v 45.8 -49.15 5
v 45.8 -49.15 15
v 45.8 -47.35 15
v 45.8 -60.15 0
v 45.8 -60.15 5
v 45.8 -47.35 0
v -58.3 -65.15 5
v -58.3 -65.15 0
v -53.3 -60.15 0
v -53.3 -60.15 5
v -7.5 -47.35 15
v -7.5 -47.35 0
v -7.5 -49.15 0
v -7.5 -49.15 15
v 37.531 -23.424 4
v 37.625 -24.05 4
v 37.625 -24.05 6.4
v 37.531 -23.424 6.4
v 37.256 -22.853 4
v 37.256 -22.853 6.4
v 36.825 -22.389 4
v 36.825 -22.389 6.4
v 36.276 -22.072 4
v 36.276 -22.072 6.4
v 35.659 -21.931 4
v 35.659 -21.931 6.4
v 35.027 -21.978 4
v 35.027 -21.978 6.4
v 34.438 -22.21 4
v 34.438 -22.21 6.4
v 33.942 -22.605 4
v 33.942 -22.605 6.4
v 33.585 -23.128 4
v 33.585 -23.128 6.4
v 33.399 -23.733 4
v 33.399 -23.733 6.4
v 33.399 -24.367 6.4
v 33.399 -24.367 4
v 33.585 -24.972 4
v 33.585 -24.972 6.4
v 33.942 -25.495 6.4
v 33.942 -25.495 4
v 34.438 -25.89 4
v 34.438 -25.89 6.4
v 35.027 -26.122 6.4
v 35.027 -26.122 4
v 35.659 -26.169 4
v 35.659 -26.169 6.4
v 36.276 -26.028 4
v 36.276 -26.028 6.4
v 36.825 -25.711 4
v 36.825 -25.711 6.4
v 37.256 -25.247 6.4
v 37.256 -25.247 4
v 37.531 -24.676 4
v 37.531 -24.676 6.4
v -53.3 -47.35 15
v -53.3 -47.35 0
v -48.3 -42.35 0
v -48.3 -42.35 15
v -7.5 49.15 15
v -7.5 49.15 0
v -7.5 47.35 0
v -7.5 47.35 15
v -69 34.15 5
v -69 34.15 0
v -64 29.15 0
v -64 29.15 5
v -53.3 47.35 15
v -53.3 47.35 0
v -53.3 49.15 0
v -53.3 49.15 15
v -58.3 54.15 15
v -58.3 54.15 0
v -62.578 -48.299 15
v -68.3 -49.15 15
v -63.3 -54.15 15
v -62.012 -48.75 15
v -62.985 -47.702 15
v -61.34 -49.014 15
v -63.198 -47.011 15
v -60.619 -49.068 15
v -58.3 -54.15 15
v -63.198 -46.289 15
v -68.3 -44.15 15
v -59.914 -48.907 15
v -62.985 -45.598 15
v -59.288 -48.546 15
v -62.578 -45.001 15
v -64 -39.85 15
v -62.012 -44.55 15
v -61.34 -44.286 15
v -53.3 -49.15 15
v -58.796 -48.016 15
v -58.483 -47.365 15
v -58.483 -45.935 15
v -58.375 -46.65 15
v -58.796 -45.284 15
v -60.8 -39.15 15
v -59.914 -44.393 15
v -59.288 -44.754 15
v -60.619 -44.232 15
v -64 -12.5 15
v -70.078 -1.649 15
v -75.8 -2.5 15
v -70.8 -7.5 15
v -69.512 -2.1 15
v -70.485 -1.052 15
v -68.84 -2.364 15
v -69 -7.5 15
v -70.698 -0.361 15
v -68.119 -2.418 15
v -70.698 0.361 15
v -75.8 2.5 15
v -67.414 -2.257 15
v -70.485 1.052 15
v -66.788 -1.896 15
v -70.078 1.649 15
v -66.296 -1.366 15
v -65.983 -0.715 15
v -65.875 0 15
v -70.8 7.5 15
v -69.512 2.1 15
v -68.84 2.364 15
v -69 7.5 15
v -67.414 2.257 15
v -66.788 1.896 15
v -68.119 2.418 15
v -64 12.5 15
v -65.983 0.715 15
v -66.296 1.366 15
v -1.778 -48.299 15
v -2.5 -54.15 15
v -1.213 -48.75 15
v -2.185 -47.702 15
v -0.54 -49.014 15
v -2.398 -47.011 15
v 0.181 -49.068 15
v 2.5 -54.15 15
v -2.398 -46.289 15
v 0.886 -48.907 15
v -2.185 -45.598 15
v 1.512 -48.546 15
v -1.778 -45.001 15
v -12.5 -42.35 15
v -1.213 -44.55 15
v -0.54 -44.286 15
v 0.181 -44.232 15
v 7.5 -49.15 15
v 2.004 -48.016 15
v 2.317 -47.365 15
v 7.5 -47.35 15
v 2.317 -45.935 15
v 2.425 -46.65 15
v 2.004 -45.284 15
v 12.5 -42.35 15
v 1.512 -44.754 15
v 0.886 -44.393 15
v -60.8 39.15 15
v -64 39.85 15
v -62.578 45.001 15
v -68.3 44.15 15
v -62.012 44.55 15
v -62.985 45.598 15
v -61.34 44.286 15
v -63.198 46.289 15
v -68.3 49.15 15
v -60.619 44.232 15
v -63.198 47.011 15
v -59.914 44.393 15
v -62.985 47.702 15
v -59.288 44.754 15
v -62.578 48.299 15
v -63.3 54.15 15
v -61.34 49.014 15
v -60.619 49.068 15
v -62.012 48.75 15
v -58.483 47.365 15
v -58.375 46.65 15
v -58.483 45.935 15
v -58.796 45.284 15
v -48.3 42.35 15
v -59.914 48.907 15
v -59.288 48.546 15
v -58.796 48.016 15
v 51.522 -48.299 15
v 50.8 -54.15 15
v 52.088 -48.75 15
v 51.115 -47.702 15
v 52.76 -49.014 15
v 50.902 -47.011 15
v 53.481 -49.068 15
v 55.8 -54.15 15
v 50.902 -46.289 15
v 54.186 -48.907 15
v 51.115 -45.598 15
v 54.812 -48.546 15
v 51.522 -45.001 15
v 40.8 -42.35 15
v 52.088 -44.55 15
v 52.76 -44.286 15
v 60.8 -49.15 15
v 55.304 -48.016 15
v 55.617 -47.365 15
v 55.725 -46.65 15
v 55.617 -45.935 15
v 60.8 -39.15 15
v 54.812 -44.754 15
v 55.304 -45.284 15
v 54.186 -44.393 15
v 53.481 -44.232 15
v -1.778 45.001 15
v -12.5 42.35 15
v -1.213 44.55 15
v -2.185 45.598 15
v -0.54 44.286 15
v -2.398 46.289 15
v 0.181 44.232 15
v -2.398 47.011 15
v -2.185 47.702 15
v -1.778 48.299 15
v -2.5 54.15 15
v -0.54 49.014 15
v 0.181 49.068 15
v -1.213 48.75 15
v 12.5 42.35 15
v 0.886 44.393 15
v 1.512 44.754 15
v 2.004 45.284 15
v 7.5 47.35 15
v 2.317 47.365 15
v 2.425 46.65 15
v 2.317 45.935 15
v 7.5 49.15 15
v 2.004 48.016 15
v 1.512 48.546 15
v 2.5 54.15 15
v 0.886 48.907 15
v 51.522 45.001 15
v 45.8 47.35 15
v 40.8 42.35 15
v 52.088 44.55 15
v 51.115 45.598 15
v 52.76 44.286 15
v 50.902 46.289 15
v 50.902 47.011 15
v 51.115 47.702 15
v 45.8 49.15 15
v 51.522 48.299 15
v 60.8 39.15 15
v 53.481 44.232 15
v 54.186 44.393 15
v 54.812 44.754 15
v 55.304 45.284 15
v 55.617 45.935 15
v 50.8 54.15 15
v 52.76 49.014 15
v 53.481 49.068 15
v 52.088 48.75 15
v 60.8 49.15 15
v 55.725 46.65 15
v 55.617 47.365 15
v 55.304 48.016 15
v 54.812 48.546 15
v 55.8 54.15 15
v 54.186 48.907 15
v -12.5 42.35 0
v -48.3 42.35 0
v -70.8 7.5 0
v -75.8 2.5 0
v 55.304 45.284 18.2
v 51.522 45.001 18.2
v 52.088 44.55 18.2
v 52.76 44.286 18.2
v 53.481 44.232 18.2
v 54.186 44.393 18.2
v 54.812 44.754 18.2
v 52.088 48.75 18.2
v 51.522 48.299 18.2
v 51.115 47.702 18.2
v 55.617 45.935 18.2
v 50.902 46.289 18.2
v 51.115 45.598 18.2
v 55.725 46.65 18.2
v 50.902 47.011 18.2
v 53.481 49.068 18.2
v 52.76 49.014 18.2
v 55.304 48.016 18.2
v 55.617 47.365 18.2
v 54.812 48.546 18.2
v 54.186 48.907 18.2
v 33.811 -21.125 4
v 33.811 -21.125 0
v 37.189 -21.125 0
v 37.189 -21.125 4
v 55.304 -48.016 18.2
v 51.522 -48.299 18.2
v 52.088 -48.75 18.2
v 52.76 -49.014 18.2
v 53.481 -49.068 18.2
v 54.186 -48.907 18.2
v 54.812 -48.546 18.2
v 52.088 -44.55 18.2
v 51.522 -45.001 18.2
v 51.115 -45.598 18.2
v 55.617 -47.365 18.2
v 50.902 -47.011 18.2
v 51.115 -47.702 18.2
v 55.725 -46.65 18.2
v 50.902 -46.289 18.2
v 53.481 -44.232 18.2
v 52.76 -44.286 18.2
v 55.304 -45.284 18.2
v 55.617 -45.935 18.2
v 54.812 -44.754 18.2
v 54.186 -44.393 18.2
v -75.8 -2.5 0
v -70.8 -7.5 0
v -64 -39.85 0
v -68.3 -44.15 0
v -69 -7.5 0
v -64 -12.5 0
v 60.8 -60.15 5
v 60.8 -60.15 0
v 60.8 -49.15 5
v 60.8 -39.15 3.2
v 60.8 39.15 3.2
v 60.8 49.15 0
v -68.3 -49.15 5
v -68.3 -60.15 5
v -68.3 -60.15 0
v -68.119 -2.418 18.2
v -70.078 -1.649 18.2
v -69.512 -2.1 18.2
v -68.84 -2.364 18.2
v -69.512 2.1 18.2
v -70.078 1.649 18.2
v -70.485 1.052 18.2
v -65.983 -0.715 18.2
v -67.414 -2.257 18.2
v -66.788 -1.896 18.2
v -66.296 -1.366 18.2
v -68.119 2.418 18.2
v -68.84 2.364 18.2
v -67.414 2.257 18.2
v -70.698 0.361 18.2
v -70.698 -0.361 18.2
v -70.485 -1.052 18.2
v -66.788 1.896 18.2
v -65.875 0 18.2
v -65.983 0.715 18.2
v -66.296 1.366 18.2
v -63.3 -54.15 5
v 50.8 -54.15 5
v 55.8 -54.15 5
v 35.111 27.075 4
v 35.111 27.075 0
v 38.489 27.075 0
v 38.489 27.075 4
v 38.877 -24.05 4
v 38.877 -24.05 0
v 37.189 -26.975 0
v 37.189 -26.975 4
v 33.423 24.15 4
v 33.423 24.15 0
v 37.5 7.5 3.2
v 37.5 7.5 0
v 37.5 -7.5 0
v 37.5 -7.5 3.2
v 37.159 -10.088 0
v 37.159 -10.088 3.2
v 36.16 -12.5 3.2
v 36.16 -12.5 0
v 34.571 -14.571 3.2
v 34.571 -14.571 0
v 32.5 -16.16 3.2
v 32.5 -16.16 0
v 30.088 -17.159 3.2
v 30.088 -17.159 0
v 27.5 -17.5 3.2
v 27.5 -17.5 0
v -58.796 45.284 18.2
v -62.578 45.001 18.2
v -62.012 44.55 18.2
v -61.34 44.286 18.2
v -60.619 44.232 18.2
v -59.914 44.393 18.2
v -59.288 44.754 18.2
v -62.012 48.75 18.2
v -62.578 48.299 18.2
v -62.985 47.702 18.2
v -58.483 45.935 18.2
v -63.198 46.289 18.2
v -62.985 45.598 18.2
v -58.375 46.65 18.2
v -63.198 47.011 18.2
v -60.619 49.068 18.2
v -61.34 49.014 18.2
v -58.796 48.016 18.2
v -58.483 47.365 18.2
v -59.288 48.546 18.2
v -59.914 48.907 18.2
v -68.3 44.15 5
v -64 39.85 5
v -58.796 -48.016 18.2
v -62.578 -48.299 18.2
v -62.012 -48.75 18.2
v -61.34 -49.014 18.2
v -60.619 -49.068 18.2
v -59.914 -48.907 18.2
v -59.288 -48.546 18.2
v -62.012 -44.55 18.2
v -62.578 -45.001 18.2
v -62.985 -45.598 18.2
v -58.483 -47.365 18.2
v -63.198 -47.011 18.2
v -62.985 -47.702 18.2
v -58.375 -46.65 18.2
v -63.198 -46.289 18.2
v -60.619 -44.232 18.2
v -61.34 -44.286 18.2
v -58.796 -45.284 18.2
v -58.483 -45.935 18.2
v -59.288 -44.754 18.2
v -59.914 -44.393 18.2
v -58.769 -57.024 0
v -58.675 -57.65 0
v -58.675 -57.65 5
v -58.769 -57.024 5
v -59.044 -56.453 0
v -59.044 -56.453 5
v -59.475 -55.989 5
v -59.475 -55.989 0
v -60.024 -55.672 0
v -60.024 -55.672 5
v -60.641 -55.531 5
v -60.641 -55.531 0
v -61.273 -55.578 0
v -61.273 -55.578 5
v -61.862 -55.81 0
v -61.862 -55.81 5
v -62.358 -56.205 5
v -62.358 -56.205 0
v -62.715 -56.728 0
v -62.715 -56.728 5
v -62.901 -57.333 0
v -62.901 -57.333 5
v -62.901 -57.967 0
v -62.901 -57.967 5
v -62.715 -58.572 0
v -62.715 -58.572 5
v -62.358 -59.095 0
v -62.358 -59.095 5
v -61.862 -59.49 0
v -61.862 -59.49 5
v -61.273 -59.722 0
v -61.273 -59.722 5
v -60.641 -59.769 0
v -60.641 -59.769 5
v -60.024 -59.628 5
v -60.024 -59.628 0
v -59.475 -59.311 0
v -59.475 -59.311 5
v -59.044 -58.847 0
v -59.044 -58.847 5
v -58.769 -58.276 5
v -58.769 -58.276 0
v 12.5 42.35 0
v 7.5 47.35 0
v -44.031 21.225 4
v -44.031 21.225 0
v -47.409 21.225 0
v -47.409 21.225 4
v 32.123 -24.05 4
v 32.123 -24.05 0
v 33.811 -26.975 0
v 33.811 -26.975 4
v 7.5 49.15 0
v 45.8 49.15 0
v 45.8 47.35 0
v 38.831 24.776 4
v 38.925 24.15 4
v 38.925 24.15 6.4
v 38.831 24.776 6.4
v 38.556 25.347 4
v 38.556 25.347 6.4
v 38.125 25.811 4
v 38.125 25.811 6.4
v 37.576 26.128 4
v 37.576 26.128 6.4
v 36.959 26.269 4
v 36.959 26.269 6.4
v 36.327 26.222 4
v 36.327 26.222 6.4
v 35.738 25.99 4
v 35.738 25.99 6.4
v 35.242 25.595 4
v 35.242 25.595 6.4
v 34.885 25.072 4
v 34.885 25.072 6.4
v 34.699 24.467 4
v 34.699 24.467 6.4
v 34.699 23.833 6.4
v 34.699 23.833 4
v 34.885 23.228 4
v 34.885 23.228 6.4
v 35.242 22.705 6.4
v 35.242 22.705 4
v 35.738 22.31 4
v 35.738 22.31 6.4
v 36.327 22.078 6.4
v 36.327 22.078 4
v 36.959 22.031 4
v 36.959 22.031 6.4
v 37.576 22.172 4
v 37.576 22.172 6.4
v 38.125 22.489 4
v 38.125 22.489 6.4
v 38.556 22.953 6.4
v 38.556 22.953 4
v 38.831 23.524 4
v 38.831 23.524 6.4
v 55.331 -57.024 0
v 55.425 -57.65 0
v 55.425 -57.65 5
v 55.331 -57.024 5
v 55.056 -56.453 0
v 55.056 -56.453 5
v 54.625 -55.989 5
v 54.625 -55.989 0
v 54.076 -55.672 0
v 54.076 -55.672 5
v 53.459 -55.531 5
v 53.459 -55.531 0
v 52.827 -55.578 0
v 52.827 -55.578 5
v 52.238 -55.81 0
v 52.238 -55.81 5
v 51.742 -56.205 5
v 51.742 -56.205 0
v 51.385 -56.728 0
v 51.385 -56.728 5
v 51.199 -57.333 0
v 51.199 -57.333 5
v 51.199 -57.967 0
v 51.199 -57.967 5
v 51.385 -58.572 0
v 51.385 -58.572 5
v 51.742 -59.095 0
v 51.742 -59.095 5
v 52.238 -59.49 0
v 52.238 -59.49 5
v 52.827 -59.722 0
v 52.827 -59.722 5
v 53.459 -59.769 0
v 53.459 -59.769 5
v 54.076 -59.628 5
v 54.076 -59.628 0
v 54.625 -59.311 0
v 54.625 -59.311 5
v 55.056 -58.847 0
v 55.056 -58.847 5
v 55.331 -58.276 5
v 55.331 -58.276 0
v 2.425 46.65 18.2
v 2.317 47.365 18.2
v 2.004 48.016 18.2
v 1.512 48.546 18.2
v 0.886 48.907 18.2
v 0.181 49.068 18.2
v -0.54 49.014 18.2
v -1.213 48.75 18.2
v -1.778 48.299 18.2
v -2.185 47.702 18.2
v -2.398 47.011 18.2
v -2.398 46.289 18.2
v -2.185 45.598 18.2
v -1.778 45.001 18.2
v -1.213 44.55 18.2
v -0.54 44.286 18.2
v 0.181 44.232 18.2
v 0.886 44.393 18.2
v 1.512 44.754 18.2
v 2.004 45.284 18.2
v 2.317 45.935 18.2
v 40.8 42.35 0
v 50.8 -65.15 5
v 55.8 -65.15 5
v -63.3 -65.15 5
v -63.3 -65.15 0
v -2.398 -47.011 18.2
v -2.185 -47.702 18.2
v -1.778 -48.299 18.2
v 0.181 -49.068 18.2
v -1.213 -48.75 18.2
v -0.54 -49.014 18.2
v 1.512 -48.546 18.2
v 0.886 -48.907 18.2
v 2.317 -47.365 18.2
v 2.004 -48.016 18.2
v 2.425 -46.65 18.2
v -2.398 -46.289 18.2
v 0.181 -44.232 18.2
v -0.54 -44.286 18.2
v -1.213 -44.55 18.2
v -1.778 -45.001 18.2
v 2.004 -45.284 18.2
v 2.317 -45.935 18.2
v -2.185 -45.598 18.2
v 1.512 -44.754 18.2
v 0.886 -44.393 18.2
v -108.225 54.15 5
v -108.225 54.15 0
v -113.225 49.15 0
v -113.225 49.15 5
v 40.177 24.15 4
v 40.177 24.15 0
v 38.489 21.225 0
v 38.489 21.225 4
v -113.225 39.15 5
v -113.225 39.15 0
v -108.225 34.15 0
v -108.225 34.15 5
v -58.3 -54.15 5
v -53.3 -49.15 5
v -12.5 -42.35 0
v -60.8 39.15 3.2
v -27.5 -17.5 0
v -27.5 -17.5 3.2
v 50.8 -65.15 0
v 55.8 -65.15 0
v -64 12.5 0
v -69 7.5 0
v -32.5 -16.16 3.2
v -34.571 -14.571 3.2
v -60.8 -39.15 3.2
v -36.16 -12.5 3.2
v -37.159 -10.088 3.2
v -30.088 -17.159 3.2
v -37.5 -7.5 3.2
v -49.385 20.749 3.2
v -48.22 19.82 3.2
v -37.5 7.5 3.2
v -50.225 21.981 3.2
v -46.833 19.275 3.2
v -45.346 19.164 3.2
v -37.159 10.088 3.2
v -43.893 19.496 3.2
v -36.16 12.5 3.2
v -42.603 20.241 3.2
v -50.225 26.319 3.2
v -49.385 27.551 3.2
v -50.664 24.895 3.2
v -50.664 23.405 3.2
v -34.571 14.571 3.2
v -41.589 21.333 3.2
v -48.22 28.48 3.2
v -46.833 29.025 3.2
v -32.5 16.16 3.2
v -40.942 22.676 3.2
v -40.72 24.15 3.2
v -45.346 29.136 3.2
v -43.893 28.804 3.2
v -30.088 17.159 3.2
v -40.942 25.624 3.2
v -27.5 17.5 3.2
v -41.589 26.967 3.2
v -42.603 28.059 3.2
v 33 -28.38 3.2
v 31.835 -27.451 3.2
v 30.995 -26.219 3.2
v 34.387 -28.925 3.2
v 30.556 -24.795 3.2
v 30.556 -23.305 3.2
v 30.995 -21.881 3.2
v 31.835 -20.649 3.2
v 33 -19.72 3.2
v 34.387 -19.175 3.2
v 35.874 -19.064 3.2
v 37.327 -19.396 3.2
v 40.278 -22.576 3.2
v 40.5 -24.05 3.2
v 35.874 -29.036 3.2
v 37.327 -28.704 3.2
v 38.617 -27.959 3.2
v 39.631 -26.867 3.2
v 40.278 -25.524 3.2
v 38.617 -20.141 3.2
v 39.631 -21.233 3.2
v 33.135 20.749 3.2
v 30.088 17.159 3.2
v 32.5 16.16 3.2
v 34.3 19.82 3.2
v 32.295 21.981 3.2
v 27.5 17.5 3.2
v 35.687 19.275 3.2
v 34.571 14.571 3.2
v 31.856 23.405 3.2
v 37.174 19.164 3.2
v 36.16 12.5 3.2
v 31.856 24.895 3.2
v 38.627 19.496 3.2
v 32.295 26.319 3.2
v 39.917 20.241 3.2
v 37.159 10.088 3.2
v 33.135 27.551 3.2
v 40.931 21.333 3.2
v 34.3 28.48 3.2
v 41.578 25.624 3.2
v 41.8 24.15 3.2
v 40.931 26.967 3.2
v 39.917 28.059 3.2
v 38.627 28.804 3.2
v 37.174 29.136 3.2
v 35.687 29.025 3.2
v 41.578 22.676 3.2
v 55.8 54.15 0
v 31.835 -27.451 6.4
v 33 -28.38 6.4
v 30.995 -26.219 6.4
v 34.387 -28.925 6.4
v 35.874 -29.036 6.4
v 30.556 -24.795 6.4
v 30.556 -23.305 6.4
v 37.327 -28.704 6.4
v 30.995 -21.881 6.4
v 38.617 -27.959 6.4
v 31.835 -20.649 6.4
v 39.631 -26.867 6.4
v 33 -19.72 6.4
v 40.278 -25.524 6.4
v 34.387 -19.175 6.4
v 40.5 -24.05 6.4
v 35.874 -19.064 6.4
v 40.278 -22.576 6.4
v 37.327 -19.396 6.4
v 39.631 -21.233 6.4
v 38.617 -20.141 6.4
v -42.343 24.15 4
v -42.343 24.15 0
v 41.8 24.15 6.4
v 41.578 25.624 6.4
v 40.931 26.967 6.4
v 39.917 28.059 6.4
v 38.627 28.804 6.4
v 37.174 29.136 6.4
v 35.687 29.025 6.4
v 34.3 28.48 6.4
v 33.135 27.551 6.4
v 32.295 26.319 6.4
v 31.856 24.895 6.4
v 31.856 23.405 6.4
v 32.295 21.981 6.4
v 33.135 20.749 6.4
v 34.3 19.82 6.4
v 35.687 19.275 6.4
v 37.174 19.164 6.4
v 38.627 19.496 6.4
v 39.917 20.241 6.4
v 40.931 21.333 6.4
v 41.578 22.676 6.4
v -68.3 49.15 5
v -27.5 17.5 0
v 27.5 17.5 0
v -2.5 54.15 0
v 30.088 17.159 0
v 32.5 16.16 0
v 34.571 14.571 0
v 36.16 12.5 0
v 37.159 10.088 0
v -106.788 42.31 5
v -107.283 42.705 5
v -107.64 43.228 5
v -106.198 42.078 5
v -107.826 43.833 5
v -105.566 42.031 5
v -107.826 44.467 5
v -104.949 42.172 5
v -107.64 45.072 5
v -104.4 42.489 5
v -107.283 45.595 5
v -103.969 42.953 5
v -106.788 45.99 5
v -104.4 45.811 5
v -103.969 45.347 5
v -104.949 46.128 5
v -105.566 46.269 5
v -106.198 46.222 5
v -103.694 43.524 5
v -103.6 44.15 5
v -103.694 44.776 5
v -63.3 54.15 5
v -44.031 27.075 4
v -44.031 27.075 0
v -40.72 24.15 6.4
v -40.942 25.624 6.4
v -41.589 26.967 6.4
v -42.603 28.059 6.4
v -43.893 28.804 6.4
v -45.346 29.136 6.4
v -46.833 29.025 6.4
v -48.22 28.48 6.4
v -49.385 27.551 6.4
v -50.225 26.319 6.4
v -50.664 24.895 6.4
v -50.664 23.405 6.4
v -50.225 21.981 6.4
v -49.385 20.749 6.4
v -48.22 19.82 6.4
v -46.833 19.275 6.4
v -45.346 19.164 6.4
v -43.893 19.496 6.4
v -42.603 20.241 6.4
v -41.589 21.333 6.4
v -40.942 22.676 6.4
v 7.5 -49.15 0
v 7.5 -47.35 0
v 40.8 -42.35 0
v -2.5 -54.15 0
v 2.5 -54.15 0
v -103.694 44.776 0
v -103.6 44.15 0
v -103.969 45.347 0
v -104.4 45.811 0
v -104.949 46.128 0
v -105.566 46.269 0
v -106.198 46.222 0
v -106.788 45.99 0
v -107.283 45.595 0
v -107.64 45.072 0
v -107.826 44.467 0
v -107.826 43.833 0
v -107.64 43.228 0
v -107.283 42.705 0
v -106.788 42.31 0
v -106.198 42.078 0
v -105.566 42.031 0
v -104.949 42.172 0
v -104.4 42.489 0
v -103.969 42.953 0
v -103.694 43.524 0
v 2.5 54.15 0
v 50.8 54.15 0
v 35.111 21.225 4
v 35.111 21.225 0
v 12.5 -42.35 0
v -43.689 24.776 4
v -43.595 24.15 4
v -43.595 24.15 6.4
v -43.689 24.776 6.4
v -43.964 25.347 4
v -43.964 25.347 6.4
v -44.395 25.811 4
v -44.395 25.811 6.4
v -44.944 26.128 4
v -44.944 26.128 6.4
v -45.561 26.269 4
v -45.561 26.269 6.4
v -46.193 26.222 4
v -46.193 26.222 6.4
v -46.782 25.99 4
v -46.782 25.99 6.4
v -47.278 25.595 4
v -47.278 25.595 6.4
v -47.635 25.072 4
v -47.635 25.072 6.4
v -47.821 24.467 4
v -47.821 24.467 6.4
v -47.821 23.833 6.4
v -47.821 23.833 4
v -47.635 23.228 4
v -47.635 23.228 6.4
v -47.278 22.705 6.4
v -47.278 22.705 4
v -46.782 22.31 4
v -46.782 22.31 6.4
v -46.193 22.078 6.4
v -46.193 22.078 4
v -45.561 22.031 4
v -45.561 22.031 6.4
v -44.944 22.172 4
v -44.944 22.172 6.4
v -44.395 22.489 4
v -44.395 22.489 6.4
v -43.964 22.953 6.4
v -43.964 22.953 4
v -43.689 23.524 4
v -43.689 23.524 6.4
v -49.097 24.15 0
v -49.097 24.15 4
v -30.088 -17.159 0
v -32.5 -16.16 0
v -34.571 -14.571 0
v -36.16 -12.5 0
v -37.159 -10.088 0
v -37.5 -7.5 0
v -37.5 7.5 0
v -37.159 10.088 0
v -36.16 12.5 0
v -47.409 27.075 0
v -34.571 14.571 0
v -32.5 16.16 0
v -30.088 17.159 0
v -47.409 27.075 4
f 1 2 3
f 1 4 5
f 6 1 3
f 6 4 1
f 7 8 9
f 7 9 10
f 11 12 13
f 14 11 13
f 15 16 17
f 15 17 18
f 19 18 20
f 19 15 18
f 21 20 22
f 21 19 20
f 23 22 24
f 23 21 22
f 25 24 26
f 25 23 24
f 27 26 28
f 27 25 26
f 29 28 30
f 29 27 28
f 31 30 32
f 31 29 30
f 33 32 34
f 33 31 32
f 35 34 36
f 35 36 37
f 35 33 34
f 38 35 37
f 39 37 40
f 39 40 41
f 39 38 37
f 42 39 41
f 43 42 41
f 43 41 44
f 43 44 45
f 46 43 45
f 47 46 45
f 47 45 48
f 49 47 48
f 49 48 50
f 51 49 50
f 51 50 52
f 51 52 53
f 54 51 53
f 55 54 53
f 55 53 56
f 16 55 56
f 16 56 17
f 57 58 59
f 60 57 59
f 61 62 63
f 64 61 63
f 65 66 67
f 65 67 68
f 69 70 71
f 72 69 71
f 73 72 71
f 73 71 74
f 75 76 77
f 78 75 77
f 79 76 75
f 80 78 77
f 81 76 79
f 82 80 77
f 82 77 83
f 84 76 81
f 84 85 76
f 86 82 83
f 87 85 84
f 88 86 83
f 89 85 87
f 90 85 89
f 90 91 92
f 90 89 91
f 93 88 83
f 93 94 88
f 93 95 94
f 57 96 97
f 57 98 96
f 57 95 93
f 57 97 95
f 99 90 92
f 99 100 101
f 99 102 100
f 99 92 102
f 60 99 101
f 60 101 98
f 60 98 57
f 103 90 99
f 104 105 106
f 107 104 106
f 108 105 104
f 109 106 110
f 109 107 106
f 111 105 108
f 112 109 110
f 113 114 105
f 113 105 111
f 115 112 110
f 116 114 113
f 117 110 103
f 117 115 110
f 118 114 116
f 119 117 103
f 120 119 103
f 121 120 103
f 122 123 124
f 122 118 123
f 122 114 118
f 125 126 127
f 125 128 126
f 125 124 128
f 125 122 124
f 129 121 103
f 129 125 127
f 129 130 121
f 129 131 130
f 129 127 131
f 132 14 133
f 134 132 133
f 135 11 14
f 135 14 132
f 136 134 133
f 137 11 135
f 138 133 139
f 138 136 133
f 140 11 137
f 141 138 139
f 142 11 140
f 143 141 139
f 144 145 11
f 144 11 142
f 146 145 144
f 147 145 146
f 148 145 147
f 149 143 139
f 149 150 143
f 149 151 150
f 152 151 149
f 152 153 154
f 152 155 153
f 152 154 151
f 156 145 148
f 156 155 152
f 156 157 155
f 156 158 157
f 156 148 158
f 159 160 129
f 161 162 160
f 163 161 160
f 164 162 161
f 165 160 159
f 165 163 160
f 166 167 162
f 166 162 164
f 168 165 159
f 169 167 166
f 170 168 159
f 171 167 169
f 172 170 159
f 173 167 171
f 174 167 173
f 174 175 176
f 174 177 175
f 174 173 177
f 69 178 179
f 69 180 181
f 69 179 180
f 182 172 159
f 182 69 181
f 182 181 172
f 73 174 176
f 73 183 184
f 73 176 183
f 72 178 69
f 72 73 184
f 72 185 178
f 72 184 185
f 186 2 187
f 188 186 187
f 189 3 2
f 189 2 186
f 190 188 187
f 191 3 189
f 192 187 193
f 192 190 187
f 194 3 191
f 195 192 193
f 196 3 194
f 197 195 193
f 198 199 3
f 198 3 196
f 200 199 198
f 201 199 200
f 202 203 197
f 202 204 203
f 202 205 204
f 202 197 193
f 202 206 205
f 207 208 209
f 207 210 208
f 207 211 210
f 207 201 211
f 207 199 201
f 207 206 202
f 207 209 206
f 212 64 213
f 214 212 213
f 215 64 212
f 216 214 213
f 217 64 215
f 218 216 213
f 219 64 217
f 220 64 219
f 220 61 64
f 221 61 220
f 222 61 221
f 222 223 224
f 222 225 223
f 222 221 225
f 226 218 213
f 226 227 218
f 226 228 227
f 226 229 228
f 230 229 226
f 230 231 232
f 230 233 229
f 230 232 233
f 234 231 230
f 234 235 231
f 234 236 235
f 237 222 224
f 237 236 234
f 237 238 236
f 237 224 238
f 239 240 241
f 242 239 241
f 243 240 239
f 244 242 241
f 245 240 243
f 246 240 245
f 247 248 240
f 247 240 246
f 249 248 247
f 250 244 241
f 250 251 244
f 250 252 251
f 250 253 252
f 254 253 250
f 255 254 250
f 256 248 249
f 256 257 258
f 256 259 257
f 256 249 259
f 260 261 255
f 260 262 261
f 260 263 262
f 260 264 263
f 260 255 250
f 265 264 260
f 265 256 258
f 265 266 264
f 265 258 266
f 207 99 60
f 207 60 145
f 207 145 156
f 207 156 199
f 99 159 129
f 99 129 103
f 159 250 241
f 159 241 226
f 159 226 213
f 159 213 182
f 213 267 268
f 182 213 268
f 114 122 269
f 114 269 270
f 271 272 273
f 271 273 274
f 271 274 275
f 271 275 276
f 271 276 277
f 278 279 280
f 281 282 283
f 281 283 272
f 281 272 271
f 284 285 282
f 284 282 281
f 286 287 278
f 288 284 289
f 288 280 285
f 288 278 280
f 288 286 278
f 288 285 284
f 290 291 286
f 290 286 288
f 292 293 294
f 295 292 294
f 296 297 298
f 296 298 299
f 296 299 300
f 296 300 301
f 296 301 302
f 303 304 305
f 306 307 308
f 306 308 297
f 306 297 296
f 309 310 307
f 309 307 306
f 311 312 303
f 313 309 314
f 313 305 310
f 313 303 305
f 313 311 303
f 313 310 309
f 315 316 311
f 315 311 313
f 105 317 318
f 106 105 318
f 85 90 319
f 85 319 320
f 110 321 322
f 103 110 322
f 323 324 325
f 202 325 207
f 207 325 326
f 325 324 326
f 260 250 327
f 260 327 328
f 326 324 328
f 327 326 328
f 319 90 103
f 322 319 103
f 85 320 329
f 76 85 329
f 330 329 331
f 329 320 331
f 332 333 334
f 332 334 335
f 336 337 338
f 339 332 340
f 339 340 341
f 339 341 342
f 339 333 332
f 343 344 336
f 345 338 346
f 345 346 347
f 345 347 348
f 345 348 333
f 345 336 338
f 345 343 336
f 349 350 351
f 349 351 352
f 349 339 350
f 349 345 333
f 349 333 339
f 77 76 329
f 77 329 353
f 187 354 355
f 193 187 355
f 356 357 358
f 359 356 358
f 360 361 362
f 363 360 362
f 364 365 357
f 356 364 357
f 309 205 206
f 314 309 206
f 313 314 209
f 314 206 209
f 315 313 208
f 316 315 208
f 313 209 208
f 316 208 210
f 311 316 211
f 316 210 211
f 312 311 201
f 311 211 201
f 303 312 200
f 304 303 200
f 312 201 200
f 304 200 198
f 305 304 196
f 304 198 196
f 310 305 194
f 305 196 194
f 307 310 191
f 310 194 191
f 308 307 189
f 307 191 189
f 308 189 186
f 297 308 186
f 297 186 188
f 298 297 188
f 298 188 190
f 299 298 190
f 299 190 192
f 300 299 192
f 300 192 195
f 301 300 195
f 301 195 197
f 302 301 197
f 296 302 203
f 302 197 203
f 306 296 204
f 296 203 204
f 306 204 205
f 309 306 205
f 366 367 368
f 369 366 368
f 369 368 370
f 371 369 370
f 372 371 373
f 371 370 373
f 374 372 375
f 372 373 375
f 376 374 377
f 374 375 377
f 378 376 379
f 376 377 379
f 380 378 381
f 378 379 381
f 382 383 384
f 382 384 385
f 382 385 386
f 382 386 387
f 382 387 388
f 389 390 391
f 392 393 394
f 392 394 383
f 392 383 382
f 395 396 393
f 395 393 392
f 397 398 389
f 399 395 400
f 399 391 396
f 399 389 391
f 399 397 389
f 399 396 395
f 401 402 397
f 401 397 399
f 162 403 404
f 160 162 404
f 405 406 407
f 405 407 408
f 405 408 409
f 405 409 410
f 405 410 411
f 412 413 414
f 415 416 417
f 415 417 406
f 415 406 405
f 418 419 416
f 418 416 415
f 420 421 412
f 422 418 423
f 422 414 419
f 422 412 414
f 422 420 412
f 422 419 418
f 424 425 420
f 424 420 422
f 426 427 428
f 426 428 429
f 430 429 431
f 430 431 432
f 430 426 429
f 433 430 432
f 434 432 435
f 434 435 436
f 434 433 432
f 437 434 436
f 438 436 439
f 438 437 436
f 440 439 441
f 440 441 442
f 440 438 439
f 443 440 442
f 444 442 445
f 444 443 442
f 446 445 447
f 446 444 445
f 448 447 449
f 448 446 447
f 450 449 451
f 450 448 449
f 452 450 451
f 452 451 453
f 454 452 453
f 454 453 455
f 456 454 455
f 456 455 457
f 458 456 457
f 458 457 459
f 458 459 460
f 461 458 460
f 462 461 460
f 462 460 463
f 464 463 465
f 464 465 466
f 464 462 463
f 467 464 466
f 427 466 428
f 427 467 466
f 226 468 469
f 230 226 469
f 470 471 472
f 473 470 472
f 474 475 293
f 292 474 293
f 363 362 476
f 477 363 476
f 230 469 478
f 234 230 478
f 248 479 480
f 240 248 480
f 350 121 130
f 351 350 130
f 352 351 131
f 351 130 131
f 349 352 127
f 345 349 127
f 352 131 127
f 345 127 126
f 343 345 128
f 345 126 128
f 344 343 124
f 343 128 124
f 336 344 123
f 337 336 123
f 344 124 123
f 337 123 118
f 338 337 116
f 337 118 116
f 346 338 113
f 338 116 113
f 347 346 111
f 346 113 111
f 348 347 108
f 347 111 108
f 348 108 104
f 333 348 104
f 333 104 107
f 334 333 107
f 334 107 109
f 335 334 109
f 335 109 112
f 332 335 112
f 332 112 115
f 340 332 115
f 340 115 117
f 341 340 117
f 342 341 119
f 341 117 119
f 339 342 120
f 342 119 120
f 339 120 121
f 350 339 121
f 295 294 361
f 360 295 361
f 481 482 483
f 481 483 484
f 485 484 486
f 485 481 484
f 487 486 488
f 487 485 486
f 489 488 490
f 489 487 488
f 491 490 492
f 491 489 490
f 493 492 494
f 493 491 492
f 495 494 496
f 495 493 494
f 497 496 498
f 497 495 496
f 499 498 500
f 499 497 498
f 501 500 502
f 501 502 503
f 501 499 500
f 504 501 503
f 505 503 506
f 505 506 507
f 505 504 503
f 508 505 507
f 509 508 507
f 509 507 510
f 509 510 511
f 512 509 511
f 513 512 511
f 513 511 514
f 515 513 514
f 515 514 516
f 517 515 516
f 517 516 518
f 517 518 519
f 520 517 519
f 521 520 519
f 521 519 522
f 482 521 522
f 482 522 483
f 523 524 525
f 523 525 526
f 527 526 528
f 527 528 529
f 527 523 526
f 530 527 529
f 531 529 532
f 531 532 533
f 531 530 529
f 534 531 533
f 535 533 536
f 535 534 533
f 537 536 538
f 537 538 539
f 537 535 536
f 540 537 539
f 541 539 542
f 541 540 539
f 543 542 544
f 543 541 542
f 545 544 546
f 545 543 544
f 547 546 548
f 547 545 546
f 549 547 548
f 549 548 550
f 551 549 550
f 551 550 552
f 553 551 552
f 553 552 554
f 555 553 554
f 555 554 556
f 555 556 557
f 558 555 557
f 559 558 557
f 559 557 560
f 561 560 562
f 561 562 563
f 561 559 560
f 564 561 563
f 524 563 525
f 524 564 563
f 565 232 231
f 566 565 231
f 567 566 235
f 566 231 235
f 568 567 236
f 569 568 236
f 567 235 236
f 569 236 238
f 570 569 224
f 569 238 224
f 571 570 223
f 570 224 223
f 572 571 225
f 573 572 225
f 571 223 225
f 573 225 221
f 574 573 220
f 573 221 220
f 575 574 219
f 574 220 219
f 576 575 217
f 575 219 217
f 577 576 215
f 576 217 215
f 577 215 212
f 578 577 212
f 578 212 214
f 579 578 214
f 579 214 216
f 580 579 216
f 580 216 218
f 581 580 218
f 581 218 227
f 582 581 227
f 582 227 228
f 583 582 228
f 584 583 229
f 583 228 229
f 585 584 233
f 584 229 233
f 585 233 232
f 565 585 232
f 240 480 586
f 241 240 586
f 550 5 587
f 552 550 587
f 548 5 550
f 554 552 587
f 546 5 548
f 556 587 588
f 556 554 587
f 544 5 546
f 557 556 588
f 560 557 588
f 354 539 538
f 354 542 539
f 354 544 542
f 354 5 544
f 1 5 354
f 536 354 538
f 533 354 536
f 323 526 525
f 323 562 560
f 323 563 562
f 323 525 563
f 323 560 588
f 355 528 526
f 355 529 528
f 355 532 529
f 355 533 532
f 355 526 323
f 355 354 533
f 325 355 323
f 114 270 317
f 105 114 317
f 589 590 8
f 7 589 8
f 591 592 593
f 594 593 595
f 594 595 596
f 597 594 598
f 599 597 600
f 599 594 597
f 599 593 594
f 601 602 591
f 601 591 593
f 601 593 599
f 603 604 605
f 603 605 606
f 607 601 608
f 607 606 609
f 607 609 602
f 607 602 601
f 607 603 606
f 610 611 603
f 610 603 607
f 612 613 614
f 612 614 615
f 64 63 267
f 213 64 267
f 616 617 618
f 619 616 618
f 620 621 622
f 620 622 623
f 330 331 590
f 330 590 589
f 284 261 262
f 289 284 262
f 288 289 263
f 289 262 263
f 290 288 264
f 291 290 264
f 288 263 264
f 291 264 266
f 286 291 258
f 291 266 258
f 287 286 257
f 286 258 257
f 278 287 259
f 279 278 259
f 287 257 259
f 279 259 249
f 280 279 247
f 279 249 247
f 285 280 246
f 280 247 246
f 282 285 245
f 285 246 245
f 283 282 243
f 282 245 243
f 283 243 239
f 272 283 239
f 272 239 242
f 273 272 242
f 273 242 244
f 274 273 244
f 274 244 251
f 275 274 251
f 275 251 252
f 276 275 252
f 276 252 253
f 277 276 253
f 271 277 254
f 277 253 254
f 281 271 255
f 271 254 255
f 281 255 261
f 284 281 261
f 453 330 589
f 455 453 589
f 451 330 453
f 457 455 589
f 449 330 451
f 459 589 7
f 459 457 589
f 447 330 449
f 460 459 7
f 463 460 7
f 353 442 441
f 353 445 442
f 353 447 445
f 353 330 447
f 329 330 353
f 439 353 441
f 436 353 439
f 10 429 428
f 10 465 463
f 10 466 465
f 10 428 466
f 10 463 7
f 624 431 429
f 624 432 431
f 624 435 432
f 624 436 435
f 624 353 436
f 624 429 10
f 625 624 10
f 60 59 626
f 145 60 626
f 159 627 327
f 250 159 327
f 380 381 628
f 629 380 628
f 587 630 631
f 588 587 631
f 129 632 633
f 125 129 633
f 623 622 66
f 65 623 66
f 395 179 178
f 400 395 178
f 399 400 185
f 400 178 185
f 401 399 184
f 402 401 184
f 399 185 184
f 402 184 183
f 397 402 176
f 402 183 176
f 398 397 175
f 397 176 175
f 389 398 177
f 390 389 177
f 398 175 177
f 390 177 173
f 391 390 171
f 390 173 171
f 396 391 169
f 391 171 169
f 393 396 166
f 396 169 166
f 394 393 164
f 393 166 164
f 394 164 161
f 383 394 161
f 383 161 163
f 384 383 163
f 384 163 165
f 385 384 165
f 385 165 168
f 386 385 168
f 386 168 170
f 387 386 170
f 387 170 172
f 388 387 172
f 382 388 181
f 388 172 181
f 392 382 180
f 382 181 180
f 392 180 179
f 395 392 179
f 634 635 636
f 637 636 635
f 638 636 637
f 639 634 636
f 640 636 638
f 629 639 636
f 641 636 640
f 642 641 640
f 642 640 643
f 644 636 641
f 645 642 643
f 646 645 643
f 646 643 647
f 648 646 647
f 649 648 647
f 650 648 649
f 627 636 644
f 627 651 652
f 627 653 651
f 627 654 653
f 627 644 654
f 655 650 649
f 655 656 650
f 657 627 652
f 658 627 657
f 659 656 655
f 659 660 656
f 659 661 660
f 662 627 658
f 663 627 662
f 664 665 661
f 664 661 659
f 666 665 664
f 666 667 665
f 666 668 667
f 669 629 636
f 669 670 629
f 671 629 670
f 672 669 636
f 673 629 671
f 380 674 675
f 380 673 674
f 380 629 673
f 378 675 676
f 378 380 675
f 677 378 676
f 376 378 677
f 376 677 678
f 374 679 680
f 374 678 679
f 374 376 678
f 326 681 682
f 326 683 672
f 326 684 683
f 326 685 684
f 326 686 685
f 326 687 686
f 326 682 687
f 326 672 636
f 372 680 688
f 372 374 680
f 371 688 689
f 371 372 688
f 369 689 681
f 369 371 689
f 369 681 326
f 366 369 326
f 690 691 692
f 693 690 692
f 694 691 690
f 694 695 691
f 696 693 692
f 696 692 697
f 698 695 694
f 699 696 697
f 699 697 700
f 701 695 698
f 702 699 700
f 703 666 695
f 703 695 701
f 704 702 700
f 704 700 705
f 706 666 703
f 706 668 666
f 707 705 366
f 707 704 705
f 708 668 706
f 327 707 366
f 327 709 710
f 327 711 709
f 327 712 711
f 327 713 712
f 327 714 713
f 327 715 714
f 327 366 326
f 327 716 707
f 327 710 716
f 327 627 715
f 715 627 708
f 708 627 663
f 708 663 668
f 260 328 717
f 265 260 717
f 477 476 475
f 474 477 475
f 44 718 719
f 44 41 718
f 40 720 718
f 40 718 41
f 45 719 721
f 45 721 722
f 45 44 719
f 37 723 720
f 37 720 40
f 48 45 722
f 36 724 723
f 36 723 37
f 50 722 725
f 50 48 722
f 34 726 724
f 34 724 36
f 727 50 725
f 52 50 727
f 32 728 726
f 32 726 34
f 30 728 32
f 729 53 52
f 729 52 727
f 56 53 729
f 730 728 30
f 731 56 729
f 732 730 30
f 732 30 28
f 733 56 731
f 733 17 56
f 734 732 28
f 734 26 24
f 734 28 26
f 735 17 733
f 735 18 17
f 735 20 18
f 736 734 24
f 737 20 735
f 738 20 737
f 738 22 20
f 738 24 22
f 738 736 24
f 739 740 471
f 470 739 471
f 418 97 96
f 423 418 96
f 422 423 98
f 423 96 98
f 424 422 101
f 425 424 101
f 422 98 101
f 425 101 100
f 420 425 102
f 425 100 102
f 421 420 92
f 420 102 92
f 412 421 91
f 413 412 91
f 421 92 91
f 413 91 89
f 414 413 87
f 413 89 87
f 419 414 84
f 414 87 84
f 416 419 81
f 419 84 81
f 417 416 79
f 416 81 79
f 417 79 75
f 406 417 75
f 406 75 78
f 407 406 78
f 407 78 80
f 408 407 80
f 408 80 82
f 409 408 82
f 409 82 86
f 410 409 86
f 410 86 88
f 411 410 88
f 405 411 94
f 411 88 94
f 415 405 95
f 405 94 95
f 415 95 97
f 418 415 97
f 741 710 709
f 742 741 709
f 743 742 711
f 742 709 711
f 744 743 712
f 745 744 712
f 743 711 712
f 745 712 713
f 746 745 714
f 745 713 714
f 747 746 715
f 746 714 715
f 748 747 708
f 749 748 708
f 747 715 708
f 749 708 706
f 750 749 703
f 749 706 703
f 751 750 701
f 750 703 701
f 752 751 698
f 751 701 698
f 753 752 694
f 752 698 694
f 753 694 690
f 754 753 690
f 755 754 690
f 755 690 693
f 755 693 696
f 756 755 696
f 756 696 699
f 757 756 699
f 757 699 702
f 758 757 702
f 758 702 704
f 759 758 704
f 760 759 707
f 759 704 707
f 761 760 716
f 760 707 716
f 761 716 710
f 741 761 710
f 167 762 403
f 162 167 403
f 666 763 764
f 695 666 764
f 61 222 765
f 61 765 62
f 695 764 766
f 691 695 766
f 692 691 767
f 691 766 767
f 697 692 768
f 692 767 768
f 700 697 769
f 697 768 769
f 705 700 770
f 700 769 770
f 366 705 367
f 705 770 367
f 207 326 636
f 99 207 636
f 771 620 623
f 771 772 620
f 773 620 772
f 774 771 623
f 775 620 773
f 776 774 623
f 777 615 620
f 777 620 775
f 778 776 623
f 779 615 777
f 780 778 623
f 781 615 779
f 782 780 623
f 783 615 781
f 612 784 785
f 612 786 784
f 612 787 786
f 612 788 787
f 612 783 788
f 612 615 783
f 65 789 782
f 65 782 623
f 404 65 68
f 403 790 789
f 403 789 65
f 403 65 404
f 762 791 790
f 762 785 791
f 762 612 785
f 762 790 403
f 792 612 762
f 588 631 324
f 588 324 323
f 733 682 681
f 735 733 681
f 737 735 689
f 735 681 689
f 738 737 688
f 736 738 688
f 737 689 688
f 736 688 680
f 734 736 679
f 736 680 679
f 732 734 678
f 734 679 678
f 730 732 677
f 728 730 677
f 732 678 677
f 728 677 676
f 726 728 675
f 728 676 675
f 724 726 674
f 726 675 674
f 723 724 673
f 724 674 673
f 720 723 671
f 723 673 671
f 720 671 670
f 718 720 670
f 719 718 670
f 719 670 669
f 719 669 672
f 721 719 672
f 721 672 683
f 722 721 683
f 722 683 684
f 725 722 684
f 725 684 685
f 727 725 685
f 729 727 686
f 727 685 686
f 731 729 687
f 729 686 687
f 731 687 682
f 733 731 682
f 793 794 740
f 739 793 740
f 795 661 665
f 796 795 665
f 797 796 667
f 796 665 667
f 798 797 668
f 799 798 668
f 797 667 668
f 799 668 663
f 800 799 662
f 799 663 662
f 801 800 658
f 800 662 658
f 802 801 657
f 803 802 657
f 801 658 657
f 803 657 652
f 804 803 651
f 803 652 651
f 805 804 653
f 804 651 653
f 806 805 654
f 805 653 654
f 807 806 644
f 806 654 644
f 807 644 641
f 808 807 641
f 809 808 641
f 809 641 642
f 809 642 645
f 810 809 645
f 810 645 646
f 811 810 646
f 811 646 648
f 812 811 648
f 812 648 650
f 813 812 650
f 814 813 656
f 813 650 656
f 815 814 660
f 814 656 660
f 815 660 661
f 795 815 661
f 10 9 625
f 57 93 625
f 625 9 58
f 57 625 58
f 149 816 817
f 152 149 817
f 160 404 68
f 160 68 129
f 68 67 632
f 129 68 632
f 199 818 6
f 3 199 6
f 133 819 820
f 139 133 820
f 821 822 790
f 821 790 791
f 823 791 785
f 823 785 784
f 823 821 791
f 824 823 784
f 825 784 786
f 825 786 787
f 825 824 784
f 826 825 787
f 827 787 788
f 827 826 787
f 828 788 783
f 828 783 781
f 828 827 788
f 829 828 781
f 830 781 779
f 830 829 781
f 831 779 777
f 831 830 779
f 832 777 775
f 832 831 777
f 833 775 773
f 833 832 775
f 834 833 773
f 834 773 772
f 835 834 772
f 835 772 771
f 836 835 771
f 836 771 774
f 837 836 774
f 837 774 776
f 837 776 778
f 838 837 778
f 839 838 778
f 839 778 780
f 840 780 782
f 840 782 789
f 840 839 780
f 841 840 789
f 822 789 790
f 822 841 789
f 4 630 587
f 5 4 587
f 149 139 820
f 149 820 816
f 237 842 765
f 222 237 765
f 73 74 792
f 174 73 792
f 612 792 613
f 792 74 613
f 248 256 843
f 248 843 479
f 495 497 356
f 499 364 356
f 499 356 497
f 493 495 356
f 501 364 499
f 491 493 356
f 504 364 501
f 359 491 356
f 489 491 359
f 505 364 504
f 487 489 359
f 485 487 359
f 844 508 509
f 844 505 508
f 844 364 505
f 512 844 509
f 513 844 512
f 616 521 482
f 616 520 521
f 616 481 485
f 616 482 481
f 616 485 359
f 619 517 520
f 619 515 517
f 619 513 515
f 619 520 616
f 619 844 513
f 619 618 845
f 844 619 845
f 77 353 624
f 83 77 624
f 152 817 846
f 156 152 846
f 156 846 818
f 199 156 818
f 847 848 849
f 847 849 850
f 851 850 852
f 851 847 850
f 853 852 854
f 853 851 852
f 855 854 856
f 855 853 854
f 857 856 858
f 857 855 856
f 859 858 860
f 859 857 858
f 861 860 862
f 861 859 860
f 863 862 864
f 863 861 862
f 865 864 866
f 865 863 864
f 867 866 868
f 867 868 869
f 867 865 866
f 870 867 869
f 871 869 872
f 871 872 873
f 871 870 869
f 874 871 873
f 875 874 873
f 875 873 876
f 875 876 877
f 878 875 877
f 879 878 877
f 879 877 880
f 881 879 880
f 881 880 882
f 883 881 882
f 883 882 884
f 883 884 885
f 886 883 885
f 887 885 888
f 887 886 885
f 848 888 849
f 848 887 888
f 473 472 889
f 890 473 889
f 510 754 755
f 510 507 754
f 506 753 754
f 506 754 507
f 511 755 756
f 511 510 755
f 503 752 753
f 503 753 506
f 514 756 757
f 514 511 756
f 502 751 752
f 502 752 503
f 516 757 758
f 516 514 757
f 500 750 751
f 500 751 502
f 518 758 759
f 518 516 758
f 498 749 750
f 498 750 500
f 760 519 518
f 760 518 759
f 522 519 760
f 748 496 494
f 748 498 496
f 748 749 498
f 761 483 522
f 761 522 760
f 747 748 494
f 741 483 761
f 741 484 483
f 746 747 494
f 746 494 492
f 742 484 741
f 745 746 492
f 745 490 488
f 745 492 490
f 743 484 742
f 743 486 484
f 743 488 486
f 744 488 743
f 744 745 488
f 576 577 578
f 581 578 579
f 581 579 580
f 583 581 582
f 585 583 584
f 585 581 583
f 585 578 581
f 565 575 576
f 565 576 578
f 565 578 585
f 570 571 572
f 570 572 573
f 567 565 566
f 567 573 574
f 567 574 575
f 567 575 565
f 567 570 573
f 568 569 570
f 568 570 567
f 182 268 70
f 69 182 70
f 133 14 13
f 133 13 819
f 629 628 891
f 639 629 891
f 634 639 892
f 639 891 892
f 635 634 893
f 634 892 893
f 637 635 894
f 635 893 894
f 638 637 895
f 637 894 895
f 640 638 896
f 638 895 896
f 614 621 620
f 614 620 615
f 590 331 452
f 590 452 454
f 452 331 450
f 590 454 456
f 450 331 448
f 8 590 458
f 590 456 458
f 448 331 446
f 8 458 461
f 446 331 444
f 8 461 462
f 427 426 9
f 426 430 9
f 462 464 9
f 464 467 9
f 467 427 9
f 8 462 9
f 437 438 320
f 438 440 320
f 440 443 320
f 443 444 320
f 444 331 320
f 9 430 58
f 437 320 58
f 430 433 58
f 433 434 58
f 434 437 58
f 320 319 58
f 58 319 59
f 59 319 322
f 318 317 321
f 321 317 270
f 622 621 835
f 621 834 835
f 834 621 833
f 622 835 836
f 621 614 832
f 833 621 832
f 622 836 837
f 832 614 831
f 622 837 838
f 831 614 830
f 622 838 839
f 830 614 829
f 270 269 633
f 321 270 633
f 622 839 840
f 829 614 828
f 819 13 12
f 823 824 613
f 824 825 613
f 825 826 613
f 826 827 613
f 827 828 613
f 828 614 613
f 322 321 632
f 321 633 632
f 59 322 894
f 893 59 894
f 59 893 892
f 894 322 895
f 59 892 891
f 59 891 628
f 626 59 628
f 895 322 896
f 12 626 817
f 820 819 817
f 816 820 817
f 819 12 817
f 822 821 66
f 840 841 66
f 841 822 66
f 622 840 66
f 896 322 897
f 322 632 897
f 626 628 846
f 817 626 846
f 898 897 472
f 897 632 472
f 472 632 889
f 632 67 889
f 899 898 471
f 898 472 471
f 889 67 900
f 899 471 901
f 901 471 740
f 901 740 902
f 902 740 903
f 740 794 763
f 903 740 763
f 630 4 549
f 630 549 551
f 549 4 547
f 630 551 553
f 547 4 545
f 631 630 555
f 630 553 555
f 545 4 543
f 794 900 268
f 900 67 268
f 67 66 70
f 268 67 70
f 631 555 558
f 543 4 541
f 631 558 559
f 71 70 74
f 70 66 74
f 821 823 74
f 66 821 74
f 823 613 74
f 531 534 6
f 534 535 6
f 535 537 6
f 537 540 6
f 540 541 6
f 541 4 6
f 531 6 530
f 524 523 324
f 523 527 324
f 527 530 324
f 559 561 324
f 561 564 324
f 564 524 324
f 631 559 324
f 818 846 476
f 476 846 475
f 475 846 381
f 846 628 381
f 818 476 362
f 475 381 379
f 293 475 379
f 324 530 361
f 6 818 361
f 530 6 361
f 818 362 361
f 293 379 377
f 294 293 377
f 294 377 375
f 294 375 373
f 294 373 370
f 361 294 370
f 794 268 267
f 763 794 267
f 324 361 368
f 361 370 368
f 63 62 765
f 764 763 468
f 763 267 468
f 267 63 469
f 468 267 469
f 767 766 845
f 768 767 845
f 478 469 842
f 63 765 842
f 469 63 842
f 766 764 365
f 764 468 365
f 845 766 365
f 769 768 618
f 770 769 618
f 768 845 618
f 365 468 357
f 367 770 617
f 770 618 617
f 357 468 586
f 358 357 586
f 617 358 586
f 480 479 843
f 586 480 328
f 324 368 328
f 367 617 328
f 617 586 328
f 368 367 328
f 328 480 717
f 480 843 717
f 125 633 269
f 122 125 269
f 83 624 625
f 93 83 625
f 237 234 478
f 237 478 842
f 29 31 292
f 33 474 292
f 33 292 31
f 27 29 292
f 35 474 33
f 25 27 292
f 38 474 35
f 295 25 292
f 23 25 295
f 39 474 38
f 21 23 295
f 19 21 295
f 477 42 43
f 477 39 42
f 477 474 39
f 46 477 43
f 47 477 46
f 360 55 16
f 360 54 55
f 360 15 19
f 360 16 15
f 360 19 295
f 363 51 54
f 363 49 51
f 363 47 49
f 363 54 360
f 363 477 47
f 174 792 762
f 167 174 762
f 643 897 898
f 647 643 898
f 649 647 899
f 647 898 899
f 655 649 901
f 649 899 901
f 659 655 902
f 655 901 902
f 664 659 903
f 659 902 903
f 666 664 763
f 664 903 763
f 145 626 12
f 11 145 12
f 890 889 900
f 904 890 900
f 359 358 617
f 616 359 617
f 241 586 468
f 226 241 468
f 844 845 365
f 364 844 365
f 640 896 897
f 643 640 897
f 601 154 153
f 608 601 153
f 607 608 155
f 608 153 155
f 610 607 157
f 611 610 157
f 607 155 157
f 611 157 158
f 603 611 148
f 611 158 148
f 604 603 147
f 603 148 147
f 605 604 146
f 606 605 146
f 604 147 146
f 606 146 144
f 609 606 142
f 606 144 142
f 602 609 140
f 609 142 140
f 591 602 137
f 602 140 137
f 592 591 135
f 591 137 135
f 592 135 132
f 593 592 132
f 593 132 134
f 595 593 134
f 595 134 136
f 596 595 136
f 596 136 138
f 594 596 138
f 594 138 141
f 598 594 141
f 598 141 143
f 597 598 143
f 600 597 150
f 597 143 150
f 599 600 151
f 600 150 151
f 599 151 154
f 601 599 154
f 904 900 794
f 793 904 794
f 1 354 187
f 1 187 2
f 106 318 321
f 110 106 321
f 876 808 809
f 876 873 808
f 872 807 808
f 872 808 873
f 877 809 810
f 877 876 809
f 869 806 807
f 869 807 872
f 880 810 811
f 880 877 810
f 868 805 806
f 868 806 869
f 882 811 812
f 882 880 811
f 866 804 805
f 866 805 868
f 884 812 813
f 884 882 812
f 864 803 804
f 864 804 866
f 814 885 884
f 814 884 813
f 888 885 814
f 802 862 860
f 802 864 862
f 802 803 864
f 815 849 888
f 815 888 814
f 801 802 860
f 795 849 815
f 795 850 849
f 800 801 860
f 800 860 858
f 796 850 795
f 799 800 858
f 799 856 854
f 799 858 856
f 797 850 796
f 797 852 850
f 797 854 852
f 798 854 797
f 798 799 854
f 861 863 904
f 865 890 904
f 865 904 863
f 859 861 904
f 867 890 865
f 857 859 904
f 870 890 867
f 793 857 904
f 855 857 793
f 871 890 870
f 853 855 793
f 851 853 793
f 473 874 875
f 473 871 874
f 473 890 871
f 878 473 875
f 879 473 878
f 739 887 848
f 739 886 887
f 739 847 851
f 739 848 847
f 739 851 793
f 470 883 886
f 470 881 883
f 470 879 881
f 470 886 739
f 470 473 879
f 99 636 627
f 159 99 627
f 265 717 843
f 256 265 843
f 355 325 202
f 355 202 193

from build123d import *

# Parameters (mm, degrees)
F0_W          = 121.6
F0_H          = 78.3
F0_R          = 2.125
F1_DEPTH      = 3.2
F2_R          = 5
F2_R_2        = 2.125
F3_DEPTH      = 3.2
F5_DEPTH      = 4
F7_DEPTH      = 15
F8_R          = 2.425
F9_DEPTH      = 3.2
F10_T1_DEPTH  = 15
F10_T3_DEPTH  = 40.7168298797
F10_T8_DEPTH  = 40.7168298797
F10_T13_DEPTH = 40.7168298797
F11_W         = 15
F11_H         = 17.8
F11_R         = 2.125
F11_W_2       = 50
F11_H_2       = 20
F12_DEPTH     = 5
F13_SIZE      = 5


# Not quite as in the source:
# - a fillet or chamfer that OpenCascade refuses, or shapes differently, is made with other operations: its cross-section is extruded or revolved along the edge and cut away or added
# - a feature names something its author has since deleted; it is built from what else it names


with BuildPart() as f1:
    # F0 (on Top) → F1 (new body)
    with BuildSketch(Plane.XY):
        Rectangle(F0_W, F0_H)
        with Locations((35.5, -24.05)):
            Circle(F0_R, mode=Mode.SUBTRACT)
        with BuildLine():
            ThreePointArc((37.5, -7.5), (34.5710678119, -14.5710678119), (27.5, -17.5))
            Line((27.5, -17.5), (-27.5, -17.5))
            ThreePointArc((-27.5, -17.5), (-34.5710678119, -14.5710678119), (-37.5, -7.5))
            Line((-37.5, -7.5), (-37.5, 7.5))
            ThreePointArc((-37.5, 7.5), (-34.5710678119, 14.5710678119), (-27.5, 17.5))
            Line((-27.5, 17.5), (27.5, 17.5))
            ThreePointArc((27.5, 17.5), (34.5710678119, 14.5710678119), (37.5, 7.5))
            Line((37.5, 7.5), (37.5, -7.5))
        make_face(mode=Mode.SUBTRACT)
        with Locations((-45.72, 24.15)):
            Circle(F0_R, mode=Mode.SUBTRACT)
        with Locations((36.8, 24.15)):
            Circle(F0_R, mode=Mode.SUBTRACT)
    extrude(amount=F1_DEPTH)

    # F2 (on face) → F3 (join)
    with BuildSketch(Plane.XY.offset(3.2)):
        with Locations((-45.72, 24.15)):
            Circle(F2_R)
        with Locations((-45.72, 24.15)):
            Circle(F2_R_2, mode=Mode.SUBTRACT)
        with Locations((36.8, 24.15)):
            Circle(F2_R)
        with Locations((36.8, 24.15)):
            Circle(F2_R_2, mode=Mode.SUBTRACT)
        with Locations((35.5, -24.05)):
            Circle(F2_R)
        with Locations((35.5, -24.05)):
            Circle(F2_R_2, mode=Mode.SUBTRACT)
    extrude(amount=F3_DEPTH)

    # F4 (on face) → F5 (cut)
    with BuildSketch(Plane(origin=(0, 0, 0), x_dir=(1, 0, 0), z_dir=(0, 0, -1))):
        Polygon((-44.0312504626, -21.225), (-47.4087495374, -21.225), (-49.0974990748, -24.15), (-47.4087495374, -27.075), (-44.0312504626, -27.075), (-42.3425009252, -24.15), align=None)
        Polygon((38.4887495374, -21.225), (35.1112504626, -21.225), (33.4225009252, -24.15), (35.1112504626, -27.075), (38.4887495374, -27.075), (40.1774990748, -24.15), align=None)
        Polygon((33.8112504626, 21.125), (37.1887495374, 21.125), (38.8774990748, 24.05), (37.1887495374, 26.975), (33.8112504626, 26.975), (32.1225009252, 24.05), align=None)
    extrude(amount=-F5_DEPTH, mode=Mode.SUBTRACT)

    # F6 (on Top) → F7 (join)
    with BuildSketch(Plane.XY):
        Polygon((-60.8, 39.15), (60.8, 39.15), (60.8, 54.15), (45.8, 54.15), (45.8, 42.35), (7.5, 42.35), (7.5, 54.15), (-7.5, 54.15), (-7.5, 42.35), (-53.3, 42.35), (-53.3, 54.15), (-68.3, 54.15), (-68.3, 39.15), (-64, 39.15), (-64, 7.5), (-75.8, 7.5), (-75.8, -7.5), (-64, -7.5), (-64, -39.15), (-68.3, -39.15), (-68.3, -54.15), (-53.3, -54.15), (-53.3, -42.35), (-7.5, -42.35), (-7.5, -54.15), (7.5, -54.15), (7.5, -42.35), (45.8, -42.35), (45.8, -54.15), (60.8, -54.15), (60.8, -39.15), (-60.8, -39.15), align=None)
    extrude(amount=F7_DEPTH)

    # F8 (on face) → F9 (join)
    with BuildSketch(Plane.XY.offset(15)):
        with Locations((53.3, 46.65)):
            Circle(F8_R)
        with Locations((0, 46.65)):
            Circle(F8_R)
        with Locations((-60.8, 46.65)):
            Circle(F8_R)
        with Locations((-68.3, 0)):
            Circle(F8_R)
        with Locations((-60.8, -46.65)):
            Circle(F8_R)
        with Locations((0, -46.65)):
            Circle(F8_R)
        with Locations((53.3, -46.65)):
            Circle(F8_R)
    extrude(amount=F9_DEPTH)

    # F10: chamfer of 5 on 26 edges, made by hand

    # F10_s2 → F10_t1 (join)
    with BuildSketch(Plane.XY):
        Polygon((-12.5, -42.35), (-7.5, -47.35), (-7.5, -42.35), align=None)
        Polygon((7.5, -47.35), (12.5, -42.35), (7.5, -42.35), align=None)
        Polygon((40.8, -42.35), (45.8, -47.35), (45.8, -42.35), align=None)
        Polygon((-53.3, -47.35), (-48.3, -42.35), (-53.3, -42.35), align=None)
        Polygon((-69, -7.5), (-64, -12.5), (-64, -7.5), align=None)
        Polygon((-64, 12.5), (-69, 7.5), (-64, 7.5), align=None)
        Polygon((-48.3, 42.35), (-53.3, 47.35), (-53.3, 42.35), align=None)
        Polygon((-7.5, 47.35), (-12.5, 42.35), (-7.5, 42.35), align=None)
        Polygon((45.8, 47.35), (40.8, 42.35), (45.8, 42.35), align=None)
        Polygon((12.5, 42.35), (7.5, 47.35), (7.5, 42.35), align=None)
    extrude(amount=F10_T1_DEPTH)

    # F10_s4 → F10_t3 (cut)
    with BuildSketch(Plane.XY.offset(-12.8584149398)):
        Polygon((-75.8, -2.5), (-70.8, -7.5), (-75.8, -7.5), align=None)
        Polygon((-70.8, 7.5), (-75.8, 2.5), (-75.8, 7.5), align=None)
        Polygon((-63.3, 54.15), (-68.3, 49.15), (-68.3, 54.15), align=None)
        Polygon((-53.3, 49.15), (-58.3, 54.15), (-53.3, 54.15), align=None)
        Polygon((-2.5, 54.15), (-7.5, 49.15), (-7.5, 54.15), align=None)
        Polygon((7.5, 49.15), (2.5, 54.15), (7.5, 54.15), align=None)
        Polygon((50.8, 54.15), (45.8, 49.15), (45.8, 54.15), align=None)
        Polygon((60.8, 49.15), (55.8, 54.15), (60.8, 54.15), align=None)
        Polygon((60.8, -49.15), (55.8, -54.15), (60.8, -54.15), align=None)
        Polygon((50.8, -54.15), (45.8, -49.15), (45.8, -54.15), align=None)
        Polygon((2.5, -54.15), (7.5, -49.15), (7.5, -54.15), align=None)
        Polygon((-7.5, -49.15), (-2.5, -54.15), (-7.5, -54.15), align=None)
        Polygon((-58.3, -54.15), (-53.3, -49.15), (-53.3, -54.15), align=None)
        Polygon((-68.3, -49.15), (-63.3, -54.15), (-68.3, -54.15), align=None)
    extrude(amount=F10_T3_DEPTH, mode=Mode.SUBTRACT)


with BuildPart() as f10_tool6:
    # F10_s7 → F10_t8 (new body)
    with BuildSketch(Plane.XY.offset(-12.8584149398)):
        Polygon((-68.3, 44.15), (-63.3, 39.15), (-68.3, 39.15), align=None)
    extrude(amount=F10_T8_DEPTH)

    split(bisect_by=Plane.YZ.offset(-64), keep=Keep.BOTTOM)


with BuildPart() as f1_1:
    add(f1.part)

    # F10_t5: cut F10_tool6
    add(f10_tool6.part, mode=Mode.SUBTRACT)


with BuildPart() as f10_tool11:
    # F10_s12 → F10_t13 (new body)
    with BuildSketch(Plane.XY.offset(-12.8584149398)):
        Polygon((-63.3, -39.15), (-68.3, -44.15), (-68.3, -39.15), align=None)
    extrude(amount=F10_T13_DEPTH)

    split(bisect_by=Plane.YZ.offset(-64), keep=Keep.BOTTOM)


with BuildPart() as f1_2:
    add(f1_1.part)

    # F10_t10: cut F10_tool11
    add(f10_tool11.part, mode=Mode.SUBTRACT)

    # F11 (on Top) → F12 (join)
    with BuildSketch(Plane.XY):
        with Locations((53.3, -56.25)):
            Rectangle(F11_W, F11_H)
        with Locations((53.3, -57.65)):
            Circle(F11_R, mode=Mode.SUBTRACT)
        with Locations((-60.8, -56.25)):
            Rectangle(F11_W, F11_H)
        with Locations((-60.8, -57.65)):
            Circle(F11_R, mode=Mode.SUBTRACT)
        with Locations((-88.225, 44.15)):
            Rectangle(F11_W_2, F11_H_2)
        with Locations((-105.725, 44.15)):
            Circle(F11_R, mode=Mode.SUBTRACT)
    extrude(amount=F12_DEPTH)

    # F13
    f13_edges = [f1_2.edges().sort_by_distance(p)[0] for p in [
        (-68.3, -65.15, 2.5),
        (-53.3, -65.15, 2.5),
        (45.8, -65.15, 2.5),
        (60.8, -65.15, 2.5),
        (-113.225, 54.15, 2.5),
        (-113.225, 34.15, 2.5),
        (-64, 34.15, 2.5),
    ]]
    chamfer(f13_edges, length=F13_SIZE)


solid = f1_2.part
